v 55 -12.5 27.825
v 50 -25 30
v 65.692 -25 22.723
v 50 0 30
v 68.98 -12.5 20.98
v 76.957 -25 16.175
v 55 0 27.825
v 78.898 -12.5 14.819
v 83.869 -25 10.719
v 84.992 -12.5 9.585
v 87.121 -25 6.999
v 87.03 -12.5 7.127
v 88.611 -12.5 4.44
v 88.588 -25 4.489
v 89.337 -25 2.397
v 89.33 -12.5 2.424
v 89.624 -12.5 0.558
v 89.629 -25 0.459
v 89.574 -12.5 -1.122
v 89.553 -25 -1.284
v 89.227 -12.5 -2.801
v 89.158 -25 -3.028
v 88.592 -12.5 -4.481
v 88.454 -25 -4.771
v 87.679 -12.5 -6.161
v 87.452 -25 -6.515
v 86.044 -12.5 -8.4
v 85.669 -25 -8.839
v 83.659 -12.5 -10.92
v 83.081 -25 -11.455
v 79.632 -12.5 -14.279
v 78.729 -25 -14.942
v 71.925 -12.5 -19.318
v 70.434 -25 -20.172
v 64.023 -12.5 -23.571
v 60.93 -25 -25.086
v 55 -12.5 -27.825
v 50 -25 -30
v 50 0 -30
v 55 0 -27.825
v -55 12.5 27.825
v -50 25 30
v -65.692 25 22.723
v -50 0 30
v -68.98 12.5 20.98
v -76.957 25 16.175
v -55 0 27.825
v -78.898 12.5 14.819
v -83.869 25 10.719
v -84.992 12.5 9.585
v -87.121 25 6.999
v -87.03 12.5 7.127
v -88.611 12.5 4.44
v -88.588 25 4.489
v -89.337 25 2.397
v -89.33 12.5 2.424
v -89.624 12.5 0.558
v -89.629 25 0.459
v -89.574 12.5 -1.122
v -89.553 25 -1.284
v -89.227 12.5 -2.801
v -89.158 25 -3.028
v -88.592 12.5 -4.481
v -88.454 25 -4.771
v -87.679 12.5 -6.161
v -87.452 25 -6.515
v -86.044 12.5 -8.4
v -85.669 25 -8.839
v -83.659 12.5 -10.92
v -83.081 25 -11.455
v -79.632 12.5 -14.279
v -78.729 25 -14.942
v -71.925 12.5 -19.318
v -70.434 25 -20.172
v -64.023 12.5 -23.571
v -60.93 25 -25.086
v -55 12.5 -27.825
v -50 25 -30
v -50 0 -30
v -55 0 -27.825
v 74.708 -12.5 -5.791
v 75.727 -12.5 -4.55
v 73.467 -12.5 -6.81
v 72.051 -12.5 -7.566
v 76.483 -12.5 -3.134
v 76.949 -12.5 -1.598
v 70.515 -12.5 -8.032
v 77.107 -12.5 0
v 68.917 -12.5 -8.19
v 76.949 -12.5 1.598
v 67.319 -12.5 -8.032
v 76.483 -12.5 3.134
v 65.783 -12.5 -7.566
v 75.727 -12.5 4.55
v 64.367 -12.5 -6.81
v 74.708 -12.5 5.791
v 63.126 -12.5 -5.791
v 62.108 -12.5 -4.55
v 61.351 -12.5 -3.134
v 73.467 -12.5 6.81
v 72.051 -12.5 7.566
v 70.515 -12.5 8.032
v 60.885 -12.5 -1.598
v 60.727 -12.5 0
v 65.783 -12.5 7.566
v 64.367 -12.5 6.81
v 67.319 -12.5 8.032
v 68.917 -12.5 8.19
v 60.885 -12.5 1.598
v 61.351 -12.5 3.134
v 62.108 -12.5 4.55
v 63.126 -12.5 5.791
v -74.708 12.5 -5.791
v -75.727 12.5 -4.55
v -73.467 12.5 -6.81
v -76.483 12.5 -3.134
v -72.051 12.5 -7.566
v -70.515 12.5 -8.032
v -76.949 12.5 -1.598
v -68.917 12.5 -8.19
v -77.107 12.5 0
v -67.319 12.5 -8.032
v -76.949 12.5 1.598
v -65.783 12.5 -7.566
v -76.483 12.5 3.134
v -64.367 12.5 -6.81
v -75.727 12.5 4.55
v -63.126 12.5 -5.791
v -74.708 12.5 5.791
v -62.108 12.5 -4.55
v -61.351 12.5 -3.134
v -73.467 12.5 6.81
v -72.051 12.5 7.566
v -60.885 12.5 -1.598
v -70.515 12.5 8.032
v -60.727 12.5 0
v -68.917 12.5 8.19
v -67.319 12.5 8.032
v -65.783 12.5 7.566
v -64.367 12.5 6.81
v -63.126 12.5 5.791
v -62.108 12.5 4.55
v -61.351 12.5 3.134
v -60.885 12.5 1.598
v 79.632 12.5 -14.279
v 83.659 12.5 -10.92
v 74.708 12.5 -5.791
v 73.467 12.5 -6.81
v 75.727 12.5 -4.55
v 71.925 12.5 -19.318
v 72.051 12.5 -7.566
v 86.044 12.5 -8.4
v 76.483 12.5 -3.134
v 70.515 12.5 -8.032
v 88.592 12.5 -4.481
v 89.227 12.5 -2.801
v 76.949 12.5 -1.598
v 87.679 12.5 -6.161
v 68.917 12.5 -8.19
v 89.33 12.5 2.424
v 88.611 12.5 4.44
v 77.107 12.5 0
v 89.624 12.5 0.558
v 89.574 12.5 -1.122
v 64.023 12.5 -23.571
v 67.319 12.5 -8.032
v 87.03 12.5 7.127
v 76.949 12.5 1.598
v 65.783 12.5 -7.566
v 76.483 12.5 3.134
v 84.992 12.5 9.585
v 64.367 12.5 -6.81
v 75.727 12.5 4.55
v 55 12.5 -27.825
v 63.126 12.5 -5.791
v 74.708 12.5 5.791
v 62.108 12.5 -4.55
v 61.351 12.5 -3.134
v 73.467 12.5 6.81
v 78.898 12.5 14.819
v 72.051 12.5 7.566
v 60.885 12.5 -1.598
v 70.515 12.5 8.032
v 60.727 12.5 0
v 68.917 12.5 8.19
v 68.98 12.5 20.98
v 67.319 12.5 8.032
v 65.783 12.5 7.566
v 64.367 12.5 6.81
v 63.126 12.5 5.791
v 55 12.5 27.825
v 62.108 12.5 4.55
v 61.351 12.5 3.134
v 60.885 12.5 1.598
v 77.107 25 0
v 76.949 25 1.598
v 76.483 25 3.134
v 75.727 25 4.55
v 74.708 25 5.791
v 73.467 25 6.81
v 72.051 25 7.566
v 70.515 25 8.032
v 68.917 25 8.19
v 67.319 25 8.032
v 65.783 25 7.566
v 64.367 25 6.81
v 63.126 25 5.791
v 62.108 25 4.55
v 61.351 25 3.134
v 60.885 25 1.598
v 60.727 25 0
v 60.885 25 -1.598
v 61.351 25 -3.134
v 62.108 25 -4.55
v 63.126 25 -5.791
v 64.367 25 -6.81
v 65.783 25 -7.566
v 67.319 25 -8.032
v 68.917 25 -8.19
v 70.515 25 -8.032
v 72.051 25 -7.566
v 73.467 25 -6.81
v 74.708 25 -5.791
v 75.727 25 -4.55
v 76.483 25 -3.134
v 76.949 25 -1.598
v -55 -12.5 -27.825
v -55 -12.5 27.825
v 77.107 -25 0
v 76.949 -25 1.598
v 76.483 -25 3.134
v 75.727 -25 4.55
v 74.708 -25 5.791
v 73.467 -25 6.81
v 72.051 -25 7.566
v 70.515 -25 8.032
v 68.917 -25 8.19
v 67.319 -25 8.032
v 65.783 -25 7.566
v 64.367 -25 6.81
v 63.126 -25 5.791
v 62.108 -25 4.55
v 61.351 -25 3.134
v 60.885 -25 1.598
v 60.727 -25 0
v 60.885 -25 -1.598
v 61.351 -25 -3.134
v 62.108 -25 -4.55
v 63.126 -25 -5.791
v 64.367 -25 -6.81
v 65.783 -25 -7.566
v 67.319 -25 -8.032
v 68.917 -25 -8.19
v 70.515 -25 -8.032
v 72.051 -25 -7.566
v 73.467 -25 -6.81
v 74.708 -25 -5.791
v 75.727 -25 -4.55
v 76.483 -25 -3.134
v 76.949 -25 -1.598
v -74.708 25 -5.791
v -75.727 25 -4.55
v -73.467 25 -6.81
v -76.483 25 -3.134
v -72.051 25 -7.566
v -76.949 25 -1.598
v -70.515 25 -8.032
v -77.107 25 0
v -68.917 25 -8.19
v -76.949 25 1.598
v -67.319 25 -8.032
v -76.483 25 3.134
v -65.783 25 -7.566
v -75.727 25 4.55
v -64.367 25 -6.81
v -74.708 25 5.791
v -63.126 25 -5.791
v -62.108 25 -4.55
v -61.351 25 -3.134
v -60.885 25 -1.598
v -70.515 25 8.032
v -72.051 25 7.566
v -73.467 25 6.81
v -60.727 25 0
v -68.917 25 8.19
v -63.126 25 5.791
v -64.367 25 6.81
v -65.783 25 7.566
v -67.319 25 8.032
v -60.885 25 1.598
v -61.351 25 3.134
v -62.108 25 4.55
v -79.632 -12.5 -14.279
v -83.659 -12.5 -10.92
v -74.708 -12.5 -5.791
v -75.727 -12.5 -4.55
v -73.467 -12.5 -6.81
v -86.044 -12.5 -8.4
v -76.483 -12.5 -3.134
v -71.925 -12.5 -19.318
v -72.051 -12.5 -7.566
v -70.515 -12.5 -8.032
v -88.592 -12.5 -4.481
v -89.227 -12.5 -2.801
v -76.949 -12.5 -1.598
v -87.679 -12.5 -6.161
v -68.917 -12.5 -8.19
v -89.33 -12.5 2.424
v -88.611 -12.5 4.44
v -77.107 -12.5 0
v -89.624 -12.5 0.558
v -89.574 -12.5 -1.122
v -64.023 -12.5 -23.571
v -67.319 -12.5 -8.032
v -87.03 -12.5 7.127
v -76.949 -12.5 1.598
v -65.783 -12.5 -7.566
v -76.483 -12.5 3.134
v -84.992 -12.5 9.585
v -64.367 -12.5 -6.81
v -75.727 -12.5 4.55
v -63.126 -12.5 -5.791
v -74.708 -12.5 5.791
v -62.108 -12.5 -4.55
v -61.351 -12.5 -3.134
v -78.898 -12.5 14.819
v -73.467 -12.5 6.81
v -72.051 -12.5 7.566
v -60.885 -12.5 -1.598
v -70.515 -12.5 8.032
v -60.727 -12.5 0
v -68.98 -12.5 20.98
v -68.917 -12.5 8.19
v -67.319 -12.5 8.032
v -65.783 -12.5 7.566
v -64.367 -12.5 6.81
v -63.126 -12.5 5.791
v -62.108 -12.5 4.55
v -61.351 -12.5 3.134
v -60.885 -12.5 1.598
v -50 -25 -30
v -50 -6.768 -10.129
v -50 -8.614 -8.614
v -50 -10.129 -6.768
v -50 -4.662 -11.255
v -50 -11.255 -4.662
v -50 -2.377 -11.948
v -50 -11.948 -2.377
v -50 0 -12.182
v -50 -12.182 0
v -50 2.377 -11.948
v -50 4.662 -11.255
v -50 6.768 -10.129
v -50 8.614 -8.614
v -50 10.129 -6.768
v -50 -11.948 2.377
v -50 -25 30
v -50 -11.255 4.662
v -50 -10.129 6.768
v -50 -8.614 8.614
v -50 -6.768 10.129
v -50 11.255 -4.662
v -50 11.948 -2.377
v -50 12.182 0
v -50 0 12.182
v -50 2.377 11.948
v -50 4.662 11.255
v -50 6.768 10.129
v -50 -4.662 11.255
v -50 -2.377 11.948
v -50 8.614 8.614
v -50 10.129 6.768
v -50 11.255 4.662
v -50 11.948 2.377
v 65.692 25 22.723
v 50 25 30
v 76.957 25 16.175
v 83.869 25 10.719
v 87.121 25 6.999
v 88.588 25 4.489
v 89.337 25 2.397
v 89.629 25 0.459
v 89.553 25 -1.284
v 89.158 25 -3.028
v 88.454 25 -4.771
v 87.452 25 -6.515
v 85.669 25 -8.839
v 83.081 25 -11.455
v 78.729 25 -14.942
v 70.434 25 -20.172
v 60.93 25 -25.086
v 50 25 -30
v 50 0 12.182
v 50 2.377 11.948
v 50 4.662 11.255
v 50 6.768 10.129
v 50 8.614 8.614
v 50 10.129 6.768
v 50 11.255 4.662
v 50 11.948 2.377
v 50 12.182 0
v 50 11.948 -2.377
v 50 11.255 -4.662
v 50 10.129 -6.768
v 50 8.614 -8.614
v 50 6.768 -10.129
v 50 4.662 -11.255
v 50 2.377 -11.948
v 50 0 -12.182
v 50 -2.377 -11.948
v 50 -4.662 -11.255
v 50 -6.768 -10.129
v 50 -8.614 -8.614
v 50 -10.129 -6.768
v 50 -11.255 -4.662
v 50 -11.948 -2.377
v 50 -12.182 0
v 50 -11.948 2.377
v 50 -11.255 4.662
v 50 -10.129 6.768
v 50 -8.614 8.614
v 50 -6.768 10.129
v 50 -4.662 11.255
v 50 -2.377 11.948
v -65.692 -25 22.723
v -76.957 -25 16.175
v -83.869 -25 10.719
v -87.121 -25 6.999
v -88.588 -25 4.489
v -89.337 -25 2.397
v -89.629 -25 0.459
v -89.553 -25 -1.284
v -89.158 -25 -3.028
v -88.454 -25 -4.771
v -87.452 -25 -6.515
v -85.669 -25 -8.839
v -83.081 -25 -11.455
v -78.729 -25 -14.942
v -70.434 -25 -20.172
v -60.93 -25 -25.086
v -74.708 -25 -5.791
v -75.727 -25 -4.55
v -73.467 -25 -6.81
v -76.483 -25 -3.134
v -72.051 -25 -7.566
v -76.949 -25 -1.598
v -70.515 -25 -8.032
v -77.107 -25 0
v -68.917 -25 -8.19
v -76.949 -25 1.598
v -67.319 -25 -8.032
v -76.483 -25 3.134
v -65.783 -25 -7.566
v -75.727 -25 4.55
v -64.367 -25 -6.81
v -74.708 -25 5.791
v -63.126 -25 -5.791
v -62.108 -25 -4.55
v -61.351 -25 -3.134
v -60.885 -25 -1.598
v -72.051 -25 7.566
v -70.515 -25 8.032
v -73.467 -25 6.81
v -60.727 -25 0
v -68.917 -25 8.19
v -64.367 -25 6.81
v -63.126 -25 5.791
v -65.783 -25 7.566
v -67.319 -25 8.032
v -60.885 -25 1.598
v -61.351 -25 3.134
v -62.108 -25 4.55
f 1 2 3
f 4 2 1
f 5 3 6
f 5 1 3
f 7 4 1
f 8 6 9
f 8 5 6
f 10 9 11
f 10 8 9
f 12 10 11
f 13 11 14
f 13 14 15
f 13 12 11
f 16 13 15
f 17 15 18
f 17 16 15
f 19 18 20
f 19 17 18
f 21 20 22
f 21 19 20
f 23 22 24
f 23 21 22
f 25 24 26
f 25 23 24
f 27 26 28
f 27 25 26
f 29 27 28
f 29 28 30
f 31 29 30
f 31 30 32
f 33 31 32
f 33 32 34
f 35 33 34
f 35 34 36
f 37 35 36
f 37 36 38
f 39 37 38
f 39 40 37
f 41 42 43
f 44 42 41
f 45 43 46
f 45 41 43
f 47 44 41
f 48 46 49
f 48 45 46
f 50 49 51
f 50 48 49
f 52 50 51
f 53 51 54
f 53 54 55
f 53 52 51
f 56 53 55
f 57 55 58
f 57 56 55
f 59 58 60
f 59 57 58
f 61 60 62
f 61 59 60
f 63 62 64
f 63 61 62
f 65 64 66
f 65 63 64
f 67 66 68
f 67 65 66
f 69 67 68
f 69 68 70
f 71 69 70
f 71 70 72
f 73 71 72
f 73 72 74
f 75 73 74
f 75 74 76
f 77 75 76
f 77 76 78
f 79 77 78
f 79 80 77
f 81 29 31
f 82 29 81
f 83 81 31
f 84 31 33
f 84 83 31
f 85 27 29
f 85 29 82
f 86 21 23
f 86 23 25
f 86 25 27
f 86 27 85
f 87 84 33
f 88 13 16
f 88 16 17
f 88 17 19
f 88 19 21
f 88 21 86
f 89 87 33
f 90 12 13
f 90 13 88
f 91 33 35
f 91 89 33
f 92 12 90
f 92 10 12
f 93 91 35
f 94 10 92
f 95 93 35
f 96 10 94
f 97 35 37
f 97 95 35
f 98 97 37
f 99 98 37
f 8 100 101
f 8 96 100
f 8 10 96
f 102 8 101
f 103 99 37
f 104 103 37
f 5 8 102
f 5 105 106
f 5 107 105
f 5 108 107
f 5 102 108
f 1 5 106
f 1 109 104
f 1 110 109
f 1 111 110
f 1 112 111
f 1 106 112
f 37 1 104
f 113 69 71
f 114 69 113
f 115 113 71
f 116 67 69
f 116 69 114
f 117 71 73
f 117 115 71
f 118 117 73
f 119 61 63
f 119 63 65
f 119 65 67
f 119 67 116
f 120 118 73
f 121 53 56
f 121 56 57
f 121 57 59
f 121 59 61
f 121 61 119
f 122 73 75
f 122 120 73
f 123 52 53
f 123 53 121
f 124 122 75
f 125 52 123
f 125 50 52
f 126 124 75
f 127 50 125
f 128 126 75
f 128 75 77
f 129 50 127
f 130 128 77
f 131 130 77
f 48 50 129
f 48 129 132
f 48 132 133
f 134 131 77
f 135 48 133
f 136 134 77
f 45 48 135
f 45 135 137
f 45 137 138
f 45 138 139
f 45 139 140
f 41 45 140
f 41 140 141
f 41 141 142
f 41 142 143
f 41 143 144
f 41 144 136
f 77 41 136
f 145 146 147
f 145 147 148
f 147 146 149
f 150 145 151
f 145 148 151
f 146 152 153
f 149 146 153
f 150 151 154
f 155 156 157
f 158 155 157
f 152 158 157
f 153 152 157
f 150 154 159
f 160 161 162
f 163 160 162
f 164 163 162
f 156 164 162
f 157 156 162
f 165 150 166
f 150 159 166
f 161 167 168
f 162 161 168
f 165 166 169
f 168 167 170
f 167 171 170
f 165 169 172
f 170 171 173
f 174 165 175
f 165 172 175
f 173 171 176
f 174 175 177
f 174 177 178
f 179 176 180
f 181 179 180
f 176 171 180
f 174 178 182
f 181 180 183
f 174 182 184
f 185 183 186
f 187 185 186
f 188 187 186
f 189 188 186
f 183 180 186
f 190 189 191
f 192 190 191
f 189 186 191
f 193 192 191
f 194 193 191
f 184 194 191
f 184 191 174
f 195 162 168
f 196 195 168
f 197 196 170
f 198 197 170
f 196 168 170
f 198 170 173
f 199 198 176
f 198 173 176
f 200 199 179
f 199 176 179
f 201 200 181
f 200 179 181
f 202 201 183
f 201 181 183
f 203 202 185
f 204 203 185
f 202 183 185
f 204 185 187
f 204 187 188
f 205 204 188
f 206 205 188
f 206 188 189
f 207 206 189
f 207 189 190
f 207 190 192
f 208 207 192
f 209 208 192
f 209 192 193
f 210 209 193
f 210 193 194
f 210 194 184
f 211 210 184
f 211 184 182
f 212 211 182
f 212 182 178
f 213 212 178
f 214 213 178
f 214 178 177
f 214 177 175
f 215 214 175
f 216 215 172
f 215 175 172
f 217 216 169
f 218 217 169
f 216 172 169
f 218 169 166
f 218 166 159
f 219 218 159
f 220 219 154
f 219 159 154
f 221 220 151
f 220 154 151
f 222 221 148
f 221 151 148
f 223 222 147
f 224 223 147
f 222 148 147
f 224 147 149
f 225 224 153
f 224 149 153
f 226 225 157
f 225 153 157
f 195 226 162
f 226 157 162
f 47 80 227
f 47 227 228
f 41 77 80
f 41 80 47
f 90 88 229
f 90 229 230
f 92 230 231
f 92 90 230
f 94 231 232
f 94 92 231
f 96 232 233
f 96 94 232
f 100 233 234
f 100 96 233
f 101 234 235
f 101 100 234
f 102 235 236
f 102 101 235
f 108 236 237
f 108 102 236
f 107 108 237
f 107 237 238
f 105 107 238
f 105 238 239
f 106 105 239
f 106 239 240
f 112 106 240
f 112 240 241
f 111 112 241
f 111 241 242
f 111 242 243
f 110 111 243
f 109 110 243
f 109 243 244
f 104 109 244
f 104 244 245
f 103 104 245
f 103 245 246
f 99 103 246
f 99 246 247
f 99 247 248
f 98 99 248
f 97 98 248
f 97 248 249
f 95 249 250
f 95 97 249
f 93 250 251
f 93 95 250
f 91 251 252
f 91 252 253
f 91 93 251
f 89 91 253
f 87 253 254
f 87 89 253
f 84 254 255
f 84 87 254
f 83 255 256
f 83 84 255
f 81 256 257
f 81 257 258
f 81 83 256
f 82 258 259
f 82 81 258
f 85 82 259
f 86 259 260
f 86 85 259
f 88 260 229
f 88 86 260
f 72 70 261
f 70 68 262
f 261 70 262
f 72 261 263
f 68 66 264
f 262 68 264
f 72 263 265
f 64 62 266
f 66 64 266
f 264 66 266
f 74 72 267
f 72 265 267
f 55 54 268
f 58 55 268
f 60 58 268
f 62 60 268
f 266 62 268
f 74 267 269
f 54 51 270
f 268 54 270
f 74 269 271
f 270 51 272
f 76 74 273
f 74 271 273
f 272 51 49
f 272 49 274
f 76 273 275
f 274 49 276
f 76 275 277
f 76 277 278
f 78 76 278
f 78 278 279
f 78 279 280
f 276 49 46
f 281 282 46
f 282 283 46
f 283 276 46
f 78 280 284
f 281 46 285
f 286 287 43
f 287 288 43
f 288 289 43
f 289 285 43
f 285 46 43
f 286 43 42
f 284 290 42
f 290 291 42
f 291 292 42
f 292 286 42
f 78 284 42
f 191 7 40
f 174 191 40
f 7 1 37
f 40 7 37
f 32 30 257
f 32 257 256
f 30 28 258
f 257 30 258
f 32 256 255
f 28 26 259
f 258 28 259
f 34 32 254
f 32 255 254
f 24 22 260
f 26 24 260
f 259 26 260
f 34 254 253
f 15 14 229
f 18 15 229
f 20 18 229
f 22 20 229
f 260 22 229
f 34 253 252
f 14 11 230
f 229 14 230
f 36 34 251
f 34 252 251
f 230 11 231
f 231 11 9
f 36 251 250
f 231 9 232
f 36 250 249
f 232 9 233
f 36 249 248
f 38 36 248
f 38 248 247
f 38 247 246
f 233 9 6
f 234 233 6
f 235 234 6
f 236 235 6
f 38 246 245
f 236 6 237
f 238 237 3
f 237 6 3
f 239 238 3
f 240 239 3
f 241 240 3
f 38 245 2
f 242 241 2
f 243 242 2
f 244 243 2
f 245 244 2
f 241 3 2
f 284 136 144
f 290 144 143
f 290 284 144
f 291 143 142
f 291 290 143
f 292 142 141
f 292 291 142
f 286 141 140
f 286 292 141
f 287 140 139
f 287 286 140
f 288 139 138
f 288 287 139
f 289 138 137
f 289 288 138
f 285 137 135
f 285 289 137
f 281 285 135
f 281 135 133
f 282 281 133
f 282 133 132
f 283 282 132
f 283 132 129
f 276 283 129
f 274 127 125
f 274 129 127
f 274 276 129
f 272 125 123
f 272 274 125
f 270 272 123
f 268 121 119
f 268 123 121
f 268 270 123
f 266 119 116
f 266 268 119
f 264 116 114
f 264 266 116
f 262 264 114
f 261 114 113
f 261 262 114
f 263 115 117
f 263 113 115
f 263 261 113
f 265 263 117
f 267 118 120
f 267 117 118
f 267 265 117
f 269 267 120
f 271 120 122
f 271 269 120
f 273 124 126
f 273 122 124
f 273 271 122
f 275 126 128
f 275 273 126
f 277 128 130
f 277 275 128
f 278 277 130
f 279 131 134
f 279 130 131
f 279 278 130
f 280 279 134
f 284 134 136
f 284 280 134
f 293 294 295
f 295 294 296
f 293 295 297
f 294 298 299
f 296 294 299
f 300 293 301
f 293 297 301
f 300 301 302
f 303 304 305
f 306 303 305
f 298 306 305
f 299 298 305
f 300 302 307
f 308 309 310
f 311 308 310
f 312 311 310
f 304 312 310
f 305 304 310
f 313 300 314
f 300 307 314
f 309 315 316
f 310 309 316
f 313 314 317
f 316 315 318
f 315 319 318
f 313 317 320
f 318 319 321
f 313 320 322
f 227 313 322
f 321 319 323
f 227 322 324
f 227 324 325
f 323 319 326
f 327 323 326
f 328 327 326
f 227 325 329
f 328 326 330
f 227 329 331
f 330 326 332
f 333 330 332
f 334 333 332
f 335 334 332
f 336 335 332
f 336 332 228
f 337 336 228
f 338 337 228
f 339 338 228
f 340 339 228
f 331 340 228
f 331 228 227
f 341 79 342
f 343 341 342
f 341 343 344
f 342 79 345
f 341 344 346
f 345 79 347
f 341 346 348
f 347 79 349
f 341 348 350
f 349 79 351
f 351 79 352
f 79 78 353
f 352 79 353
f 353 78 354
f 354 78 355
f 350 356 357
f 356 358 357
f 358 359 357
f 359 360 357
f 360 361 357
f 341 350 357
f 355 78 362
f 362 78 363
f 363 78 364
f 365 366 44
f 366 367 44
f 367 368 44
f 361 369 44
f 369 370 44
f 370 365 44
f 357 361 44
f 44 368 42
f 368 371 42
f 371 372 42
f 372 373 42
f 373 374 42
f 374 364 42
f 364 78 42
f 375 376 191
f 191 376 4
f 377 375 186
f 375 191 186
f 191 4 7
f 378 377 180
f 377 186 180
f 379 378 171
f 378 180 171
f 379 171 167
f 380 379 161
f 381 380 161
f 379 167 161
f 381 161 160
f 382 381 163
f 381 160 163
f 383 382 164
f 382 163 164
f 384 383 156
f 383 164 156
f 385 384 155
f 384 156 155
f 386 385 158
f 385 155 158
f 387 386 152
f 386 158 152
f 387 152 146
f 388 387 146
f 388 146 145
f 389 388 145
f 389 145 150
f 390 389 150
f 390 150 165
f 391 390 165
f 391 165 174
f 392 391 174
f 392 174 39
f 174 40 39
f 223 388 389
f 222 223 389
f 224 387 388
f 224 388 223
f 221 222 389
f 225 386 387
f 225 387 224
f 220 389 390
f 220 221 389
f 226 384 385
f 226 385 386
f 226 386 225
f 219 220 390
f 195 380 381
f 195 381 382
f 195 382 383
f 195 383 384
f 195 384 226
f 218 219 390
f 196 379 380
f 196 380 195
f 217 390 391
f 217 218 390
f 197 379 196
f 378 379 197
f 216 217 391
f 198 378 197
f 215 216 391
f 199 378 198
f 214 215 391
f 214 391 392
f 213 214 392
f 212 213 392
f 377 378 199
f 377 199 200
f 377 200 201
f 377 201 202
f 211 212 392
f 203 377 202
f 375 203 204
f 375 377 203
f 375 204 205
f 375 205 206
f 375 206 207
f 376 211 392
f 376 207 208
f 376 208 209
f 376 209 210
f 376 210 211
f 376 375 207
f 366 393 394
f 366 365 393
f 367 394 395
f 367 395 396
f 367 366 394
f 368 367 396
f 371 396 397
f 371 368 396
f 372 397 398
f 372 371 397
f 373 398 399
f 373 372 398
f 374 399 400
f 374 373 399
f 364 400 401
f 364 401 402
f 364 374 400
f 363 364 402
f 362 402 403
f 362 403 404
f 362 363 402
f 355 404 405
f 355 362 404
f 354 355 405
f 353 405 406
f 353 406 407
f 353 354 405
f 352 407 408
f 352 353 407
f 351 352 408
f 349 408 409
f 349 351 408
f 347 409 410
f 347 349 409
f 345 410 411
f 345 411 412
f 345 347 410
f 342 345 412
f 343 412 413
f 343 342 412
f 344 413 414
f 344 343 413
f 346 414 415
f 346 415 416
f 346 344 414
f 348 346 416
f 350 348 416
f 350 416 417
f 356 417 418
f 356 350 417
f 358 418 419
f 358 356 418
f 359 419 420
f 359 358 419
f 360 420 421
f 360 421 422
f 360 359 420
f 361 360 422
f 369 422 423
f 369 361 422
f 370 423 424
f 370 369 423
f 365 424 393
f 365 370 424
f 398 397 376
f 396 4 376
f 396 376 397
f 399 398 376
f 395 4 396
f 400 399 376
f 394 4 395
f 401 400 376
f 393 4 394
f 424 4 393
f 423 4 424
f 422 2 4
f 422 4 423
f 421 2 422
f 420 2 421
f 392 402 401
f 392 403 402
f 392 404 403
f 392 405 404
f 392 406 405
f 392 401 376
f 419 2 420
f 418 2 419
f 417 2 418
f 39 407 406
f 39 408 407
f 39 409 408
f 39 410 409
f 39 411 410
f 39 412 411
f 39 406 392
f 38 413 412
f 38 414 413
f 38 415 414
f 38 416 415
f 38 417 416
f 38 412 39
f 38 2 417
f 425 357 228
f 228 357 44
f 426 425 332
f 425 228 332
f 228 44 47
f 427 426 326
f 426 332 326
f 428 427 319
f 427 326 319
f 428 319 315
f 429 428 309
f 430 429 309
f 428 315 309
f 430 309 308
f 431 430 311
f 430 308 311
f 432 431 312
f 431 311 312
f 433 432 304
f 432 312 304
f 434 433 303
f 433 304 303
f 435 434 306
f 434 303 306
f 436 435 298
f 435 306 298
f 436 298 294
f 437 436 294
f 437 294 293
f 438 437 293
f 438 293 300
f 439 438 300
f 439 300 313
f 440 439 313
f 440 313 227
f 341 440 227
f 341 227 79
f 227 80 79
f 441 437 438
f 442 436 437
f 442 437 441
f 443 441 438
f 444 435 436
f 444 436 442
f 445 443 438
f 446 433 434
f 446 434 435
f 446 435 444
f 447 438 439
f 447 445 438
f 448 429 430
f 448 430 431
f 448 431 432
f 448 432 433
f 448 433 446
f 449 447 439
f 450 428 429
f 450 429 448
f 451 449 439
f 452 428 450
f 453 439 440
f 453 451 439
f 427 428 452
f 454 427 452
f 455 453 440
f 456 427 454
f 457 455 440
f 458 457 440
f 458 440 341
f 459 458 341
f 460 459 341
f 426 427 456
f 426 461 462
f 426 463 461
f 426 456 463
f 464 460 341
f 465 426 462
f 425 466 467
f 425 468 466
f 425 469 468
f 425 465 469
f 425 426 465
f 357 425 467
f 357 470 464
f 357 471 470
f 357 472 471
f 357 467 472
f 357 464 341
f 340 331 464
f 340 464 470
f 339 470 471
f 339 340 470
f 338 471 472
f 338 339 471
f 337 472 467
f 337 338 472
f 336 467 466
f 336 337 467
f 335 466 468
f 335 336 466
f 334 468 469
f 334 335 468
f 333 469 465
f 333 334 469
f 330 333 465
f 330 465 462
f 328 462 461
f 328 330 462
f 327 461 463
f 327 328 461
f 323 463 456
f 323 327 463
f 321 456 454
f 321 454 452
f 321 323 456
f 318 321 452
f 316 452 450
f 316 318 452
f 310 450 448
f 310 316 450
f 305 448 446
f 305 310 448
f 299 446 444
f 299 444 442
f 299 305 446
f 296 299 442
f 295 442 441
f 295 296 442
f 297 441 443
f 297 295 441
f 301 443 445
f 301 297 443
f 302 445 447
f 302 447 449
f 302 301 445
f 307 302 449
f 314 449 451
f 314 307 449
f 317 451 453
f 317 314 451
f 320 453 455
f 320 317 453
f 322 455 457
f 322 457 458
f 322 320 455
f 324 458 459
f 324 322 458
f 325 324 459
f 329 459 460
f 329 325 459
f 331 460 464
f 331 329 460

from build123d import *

# Parameters (mm, degrees)
F2_R     = 8.189749857
F3_DEPTH = 25
F5_DEPTH = 12.5


with BuildPart() as f1:
    # F0 (on Front) → F1 (revolve)
    with BuildSketch(Plane.XZ):
        Polygon((0, 12.1819740161), (-50, 12.1819740161), (-50, 0), (50, 0), (50, 12.1819740161), align=None)
    revolve(axis=Axis((74.9588809907, 0, 0), (-1, 0, 0)))

    # F2 (on Front) → F3 (join, symmetric)
    with BuildSketch(Plane.XZ):
        with BuildLine():
            Line((-50, -30), (-50, 30))
            add(Edge.make_bspline(
                [(-50, 30), (-73.5387891531, 20), (-105.7427436113, 0), (-73.5387891531, -20), (-50, -30)],
                knots=[0, 0, 0, 0, 0.5, 1, 1, 1, 1], degree=3))
        make_face()
        with Locations((-68.91708076, 0)):
            Circle(F2_R, mode=Mode.SUBTRACT)
        with BuildLine():
            add(Edge.make_bspline(
                [(50, 30), (73.5387891531, 20), (105.7427436113, 0), (73.5387891531, -20), (50, -30)],
                knots=[0, 0, 0, 0, 0.5, 1, 1, 1, 1], degree=3))
            Line((50, 30), (50, -30))
        make_face()
        with Locations((68.91708076, 0)):
            Circle(F2_R, mode=Mode.SUBTRACT)
    extrude(amount=F3_DEPTH, both=True)

    # F4 (on Front) → F5 (cut, symmetric)
    with BuildSketch(Plane.XZ):
        with BuildLine():
            Line((-55, -27.8246053089), (-55, 27.8246053089))
            add(Edge.make_bspline(
                [(-55, 27.8246053089), (-75.7893328005, 18.5497368726), (-103.492199964, -1e-10), (-75.7893328003, -18.5497368728), (-54.9999999995, -27.8246053091)],
                knots=[0.0362565782, 0.0362565782, 0.0362565782, 0.0362565782, 0.5, 0.9637434218, 0.9637434218, 0.9637434218, 0.9637434218], degree=3))
        make_face()
        with BuildLine():
            add(Edge.make_bspline(
                [(55, 27.8246053089), (75.7893328005, 18.5497368726), (103.492199964, -1e-10), (75.7893328003, -18.5497368728), (54.9999999995, -27.8246053091)],
                knots=[0.0362565782, 0.0362565782, 0.0362565782, 0.0362565782, 0.5, 0.9637434218, 0.9637434218, 0.9637434218, 0.9637434218], degree=3))
            Line((55, 27.8246053089), (55, -27.8246053089))
        make_face()
    extrude(amount=F5_DEPTH, both=True, mode=Mode.SUBTRACT)


solid = f1.part
